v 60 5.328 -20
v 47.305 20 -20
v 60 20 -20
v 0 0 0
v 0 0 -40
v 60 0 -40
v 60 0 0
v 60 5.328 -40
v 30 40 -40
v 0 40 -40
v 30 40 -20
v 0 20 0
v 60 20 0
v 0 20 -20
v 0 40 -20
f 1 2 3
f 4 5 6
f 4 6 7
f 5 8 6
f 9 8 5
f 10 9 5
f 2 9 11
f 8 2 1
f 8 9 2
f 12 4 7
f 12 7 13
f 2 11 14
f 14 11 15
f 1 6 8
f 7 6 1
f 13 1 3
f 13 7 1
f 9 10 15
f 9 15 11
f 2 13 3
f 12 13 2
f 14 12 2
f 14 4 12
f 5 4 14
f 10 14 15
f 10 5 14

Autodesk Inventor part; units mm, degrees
ref_plane "YZ Plane" through (0, 0, 0) normal (1, 0, 0) x (0, 1, 0)
ref_plane "XZ Plane" through (0, 0, 0) normal (0, 1, 0) x (-1, 0, 0)
ref_plane "XY Plane" through (0, 0, 0) normal (0, 0, 1) x (1, 0, 0)
sketch "草圖1" plane through (0, 0, 0) normal (1, 0, 0) x (0, 1, 0)
  line L0 (0, 0) -> (20, 0)
  line L1 (20, 0) -> (20, -20)
  line L2 (20, -20) -> (0, -20)
  line L3 (0, -20) -> (0, 0)
  line L4 (0, 0) -> (5.3281, 0)
  line L5 (5.3281, 0) -> (5.3281, -40)
  line L6 (5.3281, -40) -> (0, -40)
  line L7 (0, -40) -> (0, 0)
  dimension "d0" = 40
  dimension "d1" = 20
  dimension "d2" = 20
extrude "擠出1" add sketch "草圖1" along normal blind 60
sketch "草圖2" plane through (0, 0, -40) normal (0, 0, -1) x (-1, 0, 0)
  line L0 (0, 0) -> (0, 5.3281) projected
  line L1 (0, 0) -> (0, 40)
  line L2 (0, 40) -> (-30, 40)
  line L3 (0, 5.3281) -> (-60, 5.3281) projected
  line L4 (-30, 40) -> (-60, 5.3281)
  line L5 (-60, 5.3281) -> (-60, 0)
  line L6 (0, 0) -> (-60, 0) projected
  line L7 (-60, 0) -> (0, 0)
  dimension "d5" = 30
  dimension "d6" = 40
extrude "擠出2" add sketch "草圖2" against normal up to surface (20 mm away) contours L3 L4 L2 L1
properties part number "41 (61598.433 mm^3)"
